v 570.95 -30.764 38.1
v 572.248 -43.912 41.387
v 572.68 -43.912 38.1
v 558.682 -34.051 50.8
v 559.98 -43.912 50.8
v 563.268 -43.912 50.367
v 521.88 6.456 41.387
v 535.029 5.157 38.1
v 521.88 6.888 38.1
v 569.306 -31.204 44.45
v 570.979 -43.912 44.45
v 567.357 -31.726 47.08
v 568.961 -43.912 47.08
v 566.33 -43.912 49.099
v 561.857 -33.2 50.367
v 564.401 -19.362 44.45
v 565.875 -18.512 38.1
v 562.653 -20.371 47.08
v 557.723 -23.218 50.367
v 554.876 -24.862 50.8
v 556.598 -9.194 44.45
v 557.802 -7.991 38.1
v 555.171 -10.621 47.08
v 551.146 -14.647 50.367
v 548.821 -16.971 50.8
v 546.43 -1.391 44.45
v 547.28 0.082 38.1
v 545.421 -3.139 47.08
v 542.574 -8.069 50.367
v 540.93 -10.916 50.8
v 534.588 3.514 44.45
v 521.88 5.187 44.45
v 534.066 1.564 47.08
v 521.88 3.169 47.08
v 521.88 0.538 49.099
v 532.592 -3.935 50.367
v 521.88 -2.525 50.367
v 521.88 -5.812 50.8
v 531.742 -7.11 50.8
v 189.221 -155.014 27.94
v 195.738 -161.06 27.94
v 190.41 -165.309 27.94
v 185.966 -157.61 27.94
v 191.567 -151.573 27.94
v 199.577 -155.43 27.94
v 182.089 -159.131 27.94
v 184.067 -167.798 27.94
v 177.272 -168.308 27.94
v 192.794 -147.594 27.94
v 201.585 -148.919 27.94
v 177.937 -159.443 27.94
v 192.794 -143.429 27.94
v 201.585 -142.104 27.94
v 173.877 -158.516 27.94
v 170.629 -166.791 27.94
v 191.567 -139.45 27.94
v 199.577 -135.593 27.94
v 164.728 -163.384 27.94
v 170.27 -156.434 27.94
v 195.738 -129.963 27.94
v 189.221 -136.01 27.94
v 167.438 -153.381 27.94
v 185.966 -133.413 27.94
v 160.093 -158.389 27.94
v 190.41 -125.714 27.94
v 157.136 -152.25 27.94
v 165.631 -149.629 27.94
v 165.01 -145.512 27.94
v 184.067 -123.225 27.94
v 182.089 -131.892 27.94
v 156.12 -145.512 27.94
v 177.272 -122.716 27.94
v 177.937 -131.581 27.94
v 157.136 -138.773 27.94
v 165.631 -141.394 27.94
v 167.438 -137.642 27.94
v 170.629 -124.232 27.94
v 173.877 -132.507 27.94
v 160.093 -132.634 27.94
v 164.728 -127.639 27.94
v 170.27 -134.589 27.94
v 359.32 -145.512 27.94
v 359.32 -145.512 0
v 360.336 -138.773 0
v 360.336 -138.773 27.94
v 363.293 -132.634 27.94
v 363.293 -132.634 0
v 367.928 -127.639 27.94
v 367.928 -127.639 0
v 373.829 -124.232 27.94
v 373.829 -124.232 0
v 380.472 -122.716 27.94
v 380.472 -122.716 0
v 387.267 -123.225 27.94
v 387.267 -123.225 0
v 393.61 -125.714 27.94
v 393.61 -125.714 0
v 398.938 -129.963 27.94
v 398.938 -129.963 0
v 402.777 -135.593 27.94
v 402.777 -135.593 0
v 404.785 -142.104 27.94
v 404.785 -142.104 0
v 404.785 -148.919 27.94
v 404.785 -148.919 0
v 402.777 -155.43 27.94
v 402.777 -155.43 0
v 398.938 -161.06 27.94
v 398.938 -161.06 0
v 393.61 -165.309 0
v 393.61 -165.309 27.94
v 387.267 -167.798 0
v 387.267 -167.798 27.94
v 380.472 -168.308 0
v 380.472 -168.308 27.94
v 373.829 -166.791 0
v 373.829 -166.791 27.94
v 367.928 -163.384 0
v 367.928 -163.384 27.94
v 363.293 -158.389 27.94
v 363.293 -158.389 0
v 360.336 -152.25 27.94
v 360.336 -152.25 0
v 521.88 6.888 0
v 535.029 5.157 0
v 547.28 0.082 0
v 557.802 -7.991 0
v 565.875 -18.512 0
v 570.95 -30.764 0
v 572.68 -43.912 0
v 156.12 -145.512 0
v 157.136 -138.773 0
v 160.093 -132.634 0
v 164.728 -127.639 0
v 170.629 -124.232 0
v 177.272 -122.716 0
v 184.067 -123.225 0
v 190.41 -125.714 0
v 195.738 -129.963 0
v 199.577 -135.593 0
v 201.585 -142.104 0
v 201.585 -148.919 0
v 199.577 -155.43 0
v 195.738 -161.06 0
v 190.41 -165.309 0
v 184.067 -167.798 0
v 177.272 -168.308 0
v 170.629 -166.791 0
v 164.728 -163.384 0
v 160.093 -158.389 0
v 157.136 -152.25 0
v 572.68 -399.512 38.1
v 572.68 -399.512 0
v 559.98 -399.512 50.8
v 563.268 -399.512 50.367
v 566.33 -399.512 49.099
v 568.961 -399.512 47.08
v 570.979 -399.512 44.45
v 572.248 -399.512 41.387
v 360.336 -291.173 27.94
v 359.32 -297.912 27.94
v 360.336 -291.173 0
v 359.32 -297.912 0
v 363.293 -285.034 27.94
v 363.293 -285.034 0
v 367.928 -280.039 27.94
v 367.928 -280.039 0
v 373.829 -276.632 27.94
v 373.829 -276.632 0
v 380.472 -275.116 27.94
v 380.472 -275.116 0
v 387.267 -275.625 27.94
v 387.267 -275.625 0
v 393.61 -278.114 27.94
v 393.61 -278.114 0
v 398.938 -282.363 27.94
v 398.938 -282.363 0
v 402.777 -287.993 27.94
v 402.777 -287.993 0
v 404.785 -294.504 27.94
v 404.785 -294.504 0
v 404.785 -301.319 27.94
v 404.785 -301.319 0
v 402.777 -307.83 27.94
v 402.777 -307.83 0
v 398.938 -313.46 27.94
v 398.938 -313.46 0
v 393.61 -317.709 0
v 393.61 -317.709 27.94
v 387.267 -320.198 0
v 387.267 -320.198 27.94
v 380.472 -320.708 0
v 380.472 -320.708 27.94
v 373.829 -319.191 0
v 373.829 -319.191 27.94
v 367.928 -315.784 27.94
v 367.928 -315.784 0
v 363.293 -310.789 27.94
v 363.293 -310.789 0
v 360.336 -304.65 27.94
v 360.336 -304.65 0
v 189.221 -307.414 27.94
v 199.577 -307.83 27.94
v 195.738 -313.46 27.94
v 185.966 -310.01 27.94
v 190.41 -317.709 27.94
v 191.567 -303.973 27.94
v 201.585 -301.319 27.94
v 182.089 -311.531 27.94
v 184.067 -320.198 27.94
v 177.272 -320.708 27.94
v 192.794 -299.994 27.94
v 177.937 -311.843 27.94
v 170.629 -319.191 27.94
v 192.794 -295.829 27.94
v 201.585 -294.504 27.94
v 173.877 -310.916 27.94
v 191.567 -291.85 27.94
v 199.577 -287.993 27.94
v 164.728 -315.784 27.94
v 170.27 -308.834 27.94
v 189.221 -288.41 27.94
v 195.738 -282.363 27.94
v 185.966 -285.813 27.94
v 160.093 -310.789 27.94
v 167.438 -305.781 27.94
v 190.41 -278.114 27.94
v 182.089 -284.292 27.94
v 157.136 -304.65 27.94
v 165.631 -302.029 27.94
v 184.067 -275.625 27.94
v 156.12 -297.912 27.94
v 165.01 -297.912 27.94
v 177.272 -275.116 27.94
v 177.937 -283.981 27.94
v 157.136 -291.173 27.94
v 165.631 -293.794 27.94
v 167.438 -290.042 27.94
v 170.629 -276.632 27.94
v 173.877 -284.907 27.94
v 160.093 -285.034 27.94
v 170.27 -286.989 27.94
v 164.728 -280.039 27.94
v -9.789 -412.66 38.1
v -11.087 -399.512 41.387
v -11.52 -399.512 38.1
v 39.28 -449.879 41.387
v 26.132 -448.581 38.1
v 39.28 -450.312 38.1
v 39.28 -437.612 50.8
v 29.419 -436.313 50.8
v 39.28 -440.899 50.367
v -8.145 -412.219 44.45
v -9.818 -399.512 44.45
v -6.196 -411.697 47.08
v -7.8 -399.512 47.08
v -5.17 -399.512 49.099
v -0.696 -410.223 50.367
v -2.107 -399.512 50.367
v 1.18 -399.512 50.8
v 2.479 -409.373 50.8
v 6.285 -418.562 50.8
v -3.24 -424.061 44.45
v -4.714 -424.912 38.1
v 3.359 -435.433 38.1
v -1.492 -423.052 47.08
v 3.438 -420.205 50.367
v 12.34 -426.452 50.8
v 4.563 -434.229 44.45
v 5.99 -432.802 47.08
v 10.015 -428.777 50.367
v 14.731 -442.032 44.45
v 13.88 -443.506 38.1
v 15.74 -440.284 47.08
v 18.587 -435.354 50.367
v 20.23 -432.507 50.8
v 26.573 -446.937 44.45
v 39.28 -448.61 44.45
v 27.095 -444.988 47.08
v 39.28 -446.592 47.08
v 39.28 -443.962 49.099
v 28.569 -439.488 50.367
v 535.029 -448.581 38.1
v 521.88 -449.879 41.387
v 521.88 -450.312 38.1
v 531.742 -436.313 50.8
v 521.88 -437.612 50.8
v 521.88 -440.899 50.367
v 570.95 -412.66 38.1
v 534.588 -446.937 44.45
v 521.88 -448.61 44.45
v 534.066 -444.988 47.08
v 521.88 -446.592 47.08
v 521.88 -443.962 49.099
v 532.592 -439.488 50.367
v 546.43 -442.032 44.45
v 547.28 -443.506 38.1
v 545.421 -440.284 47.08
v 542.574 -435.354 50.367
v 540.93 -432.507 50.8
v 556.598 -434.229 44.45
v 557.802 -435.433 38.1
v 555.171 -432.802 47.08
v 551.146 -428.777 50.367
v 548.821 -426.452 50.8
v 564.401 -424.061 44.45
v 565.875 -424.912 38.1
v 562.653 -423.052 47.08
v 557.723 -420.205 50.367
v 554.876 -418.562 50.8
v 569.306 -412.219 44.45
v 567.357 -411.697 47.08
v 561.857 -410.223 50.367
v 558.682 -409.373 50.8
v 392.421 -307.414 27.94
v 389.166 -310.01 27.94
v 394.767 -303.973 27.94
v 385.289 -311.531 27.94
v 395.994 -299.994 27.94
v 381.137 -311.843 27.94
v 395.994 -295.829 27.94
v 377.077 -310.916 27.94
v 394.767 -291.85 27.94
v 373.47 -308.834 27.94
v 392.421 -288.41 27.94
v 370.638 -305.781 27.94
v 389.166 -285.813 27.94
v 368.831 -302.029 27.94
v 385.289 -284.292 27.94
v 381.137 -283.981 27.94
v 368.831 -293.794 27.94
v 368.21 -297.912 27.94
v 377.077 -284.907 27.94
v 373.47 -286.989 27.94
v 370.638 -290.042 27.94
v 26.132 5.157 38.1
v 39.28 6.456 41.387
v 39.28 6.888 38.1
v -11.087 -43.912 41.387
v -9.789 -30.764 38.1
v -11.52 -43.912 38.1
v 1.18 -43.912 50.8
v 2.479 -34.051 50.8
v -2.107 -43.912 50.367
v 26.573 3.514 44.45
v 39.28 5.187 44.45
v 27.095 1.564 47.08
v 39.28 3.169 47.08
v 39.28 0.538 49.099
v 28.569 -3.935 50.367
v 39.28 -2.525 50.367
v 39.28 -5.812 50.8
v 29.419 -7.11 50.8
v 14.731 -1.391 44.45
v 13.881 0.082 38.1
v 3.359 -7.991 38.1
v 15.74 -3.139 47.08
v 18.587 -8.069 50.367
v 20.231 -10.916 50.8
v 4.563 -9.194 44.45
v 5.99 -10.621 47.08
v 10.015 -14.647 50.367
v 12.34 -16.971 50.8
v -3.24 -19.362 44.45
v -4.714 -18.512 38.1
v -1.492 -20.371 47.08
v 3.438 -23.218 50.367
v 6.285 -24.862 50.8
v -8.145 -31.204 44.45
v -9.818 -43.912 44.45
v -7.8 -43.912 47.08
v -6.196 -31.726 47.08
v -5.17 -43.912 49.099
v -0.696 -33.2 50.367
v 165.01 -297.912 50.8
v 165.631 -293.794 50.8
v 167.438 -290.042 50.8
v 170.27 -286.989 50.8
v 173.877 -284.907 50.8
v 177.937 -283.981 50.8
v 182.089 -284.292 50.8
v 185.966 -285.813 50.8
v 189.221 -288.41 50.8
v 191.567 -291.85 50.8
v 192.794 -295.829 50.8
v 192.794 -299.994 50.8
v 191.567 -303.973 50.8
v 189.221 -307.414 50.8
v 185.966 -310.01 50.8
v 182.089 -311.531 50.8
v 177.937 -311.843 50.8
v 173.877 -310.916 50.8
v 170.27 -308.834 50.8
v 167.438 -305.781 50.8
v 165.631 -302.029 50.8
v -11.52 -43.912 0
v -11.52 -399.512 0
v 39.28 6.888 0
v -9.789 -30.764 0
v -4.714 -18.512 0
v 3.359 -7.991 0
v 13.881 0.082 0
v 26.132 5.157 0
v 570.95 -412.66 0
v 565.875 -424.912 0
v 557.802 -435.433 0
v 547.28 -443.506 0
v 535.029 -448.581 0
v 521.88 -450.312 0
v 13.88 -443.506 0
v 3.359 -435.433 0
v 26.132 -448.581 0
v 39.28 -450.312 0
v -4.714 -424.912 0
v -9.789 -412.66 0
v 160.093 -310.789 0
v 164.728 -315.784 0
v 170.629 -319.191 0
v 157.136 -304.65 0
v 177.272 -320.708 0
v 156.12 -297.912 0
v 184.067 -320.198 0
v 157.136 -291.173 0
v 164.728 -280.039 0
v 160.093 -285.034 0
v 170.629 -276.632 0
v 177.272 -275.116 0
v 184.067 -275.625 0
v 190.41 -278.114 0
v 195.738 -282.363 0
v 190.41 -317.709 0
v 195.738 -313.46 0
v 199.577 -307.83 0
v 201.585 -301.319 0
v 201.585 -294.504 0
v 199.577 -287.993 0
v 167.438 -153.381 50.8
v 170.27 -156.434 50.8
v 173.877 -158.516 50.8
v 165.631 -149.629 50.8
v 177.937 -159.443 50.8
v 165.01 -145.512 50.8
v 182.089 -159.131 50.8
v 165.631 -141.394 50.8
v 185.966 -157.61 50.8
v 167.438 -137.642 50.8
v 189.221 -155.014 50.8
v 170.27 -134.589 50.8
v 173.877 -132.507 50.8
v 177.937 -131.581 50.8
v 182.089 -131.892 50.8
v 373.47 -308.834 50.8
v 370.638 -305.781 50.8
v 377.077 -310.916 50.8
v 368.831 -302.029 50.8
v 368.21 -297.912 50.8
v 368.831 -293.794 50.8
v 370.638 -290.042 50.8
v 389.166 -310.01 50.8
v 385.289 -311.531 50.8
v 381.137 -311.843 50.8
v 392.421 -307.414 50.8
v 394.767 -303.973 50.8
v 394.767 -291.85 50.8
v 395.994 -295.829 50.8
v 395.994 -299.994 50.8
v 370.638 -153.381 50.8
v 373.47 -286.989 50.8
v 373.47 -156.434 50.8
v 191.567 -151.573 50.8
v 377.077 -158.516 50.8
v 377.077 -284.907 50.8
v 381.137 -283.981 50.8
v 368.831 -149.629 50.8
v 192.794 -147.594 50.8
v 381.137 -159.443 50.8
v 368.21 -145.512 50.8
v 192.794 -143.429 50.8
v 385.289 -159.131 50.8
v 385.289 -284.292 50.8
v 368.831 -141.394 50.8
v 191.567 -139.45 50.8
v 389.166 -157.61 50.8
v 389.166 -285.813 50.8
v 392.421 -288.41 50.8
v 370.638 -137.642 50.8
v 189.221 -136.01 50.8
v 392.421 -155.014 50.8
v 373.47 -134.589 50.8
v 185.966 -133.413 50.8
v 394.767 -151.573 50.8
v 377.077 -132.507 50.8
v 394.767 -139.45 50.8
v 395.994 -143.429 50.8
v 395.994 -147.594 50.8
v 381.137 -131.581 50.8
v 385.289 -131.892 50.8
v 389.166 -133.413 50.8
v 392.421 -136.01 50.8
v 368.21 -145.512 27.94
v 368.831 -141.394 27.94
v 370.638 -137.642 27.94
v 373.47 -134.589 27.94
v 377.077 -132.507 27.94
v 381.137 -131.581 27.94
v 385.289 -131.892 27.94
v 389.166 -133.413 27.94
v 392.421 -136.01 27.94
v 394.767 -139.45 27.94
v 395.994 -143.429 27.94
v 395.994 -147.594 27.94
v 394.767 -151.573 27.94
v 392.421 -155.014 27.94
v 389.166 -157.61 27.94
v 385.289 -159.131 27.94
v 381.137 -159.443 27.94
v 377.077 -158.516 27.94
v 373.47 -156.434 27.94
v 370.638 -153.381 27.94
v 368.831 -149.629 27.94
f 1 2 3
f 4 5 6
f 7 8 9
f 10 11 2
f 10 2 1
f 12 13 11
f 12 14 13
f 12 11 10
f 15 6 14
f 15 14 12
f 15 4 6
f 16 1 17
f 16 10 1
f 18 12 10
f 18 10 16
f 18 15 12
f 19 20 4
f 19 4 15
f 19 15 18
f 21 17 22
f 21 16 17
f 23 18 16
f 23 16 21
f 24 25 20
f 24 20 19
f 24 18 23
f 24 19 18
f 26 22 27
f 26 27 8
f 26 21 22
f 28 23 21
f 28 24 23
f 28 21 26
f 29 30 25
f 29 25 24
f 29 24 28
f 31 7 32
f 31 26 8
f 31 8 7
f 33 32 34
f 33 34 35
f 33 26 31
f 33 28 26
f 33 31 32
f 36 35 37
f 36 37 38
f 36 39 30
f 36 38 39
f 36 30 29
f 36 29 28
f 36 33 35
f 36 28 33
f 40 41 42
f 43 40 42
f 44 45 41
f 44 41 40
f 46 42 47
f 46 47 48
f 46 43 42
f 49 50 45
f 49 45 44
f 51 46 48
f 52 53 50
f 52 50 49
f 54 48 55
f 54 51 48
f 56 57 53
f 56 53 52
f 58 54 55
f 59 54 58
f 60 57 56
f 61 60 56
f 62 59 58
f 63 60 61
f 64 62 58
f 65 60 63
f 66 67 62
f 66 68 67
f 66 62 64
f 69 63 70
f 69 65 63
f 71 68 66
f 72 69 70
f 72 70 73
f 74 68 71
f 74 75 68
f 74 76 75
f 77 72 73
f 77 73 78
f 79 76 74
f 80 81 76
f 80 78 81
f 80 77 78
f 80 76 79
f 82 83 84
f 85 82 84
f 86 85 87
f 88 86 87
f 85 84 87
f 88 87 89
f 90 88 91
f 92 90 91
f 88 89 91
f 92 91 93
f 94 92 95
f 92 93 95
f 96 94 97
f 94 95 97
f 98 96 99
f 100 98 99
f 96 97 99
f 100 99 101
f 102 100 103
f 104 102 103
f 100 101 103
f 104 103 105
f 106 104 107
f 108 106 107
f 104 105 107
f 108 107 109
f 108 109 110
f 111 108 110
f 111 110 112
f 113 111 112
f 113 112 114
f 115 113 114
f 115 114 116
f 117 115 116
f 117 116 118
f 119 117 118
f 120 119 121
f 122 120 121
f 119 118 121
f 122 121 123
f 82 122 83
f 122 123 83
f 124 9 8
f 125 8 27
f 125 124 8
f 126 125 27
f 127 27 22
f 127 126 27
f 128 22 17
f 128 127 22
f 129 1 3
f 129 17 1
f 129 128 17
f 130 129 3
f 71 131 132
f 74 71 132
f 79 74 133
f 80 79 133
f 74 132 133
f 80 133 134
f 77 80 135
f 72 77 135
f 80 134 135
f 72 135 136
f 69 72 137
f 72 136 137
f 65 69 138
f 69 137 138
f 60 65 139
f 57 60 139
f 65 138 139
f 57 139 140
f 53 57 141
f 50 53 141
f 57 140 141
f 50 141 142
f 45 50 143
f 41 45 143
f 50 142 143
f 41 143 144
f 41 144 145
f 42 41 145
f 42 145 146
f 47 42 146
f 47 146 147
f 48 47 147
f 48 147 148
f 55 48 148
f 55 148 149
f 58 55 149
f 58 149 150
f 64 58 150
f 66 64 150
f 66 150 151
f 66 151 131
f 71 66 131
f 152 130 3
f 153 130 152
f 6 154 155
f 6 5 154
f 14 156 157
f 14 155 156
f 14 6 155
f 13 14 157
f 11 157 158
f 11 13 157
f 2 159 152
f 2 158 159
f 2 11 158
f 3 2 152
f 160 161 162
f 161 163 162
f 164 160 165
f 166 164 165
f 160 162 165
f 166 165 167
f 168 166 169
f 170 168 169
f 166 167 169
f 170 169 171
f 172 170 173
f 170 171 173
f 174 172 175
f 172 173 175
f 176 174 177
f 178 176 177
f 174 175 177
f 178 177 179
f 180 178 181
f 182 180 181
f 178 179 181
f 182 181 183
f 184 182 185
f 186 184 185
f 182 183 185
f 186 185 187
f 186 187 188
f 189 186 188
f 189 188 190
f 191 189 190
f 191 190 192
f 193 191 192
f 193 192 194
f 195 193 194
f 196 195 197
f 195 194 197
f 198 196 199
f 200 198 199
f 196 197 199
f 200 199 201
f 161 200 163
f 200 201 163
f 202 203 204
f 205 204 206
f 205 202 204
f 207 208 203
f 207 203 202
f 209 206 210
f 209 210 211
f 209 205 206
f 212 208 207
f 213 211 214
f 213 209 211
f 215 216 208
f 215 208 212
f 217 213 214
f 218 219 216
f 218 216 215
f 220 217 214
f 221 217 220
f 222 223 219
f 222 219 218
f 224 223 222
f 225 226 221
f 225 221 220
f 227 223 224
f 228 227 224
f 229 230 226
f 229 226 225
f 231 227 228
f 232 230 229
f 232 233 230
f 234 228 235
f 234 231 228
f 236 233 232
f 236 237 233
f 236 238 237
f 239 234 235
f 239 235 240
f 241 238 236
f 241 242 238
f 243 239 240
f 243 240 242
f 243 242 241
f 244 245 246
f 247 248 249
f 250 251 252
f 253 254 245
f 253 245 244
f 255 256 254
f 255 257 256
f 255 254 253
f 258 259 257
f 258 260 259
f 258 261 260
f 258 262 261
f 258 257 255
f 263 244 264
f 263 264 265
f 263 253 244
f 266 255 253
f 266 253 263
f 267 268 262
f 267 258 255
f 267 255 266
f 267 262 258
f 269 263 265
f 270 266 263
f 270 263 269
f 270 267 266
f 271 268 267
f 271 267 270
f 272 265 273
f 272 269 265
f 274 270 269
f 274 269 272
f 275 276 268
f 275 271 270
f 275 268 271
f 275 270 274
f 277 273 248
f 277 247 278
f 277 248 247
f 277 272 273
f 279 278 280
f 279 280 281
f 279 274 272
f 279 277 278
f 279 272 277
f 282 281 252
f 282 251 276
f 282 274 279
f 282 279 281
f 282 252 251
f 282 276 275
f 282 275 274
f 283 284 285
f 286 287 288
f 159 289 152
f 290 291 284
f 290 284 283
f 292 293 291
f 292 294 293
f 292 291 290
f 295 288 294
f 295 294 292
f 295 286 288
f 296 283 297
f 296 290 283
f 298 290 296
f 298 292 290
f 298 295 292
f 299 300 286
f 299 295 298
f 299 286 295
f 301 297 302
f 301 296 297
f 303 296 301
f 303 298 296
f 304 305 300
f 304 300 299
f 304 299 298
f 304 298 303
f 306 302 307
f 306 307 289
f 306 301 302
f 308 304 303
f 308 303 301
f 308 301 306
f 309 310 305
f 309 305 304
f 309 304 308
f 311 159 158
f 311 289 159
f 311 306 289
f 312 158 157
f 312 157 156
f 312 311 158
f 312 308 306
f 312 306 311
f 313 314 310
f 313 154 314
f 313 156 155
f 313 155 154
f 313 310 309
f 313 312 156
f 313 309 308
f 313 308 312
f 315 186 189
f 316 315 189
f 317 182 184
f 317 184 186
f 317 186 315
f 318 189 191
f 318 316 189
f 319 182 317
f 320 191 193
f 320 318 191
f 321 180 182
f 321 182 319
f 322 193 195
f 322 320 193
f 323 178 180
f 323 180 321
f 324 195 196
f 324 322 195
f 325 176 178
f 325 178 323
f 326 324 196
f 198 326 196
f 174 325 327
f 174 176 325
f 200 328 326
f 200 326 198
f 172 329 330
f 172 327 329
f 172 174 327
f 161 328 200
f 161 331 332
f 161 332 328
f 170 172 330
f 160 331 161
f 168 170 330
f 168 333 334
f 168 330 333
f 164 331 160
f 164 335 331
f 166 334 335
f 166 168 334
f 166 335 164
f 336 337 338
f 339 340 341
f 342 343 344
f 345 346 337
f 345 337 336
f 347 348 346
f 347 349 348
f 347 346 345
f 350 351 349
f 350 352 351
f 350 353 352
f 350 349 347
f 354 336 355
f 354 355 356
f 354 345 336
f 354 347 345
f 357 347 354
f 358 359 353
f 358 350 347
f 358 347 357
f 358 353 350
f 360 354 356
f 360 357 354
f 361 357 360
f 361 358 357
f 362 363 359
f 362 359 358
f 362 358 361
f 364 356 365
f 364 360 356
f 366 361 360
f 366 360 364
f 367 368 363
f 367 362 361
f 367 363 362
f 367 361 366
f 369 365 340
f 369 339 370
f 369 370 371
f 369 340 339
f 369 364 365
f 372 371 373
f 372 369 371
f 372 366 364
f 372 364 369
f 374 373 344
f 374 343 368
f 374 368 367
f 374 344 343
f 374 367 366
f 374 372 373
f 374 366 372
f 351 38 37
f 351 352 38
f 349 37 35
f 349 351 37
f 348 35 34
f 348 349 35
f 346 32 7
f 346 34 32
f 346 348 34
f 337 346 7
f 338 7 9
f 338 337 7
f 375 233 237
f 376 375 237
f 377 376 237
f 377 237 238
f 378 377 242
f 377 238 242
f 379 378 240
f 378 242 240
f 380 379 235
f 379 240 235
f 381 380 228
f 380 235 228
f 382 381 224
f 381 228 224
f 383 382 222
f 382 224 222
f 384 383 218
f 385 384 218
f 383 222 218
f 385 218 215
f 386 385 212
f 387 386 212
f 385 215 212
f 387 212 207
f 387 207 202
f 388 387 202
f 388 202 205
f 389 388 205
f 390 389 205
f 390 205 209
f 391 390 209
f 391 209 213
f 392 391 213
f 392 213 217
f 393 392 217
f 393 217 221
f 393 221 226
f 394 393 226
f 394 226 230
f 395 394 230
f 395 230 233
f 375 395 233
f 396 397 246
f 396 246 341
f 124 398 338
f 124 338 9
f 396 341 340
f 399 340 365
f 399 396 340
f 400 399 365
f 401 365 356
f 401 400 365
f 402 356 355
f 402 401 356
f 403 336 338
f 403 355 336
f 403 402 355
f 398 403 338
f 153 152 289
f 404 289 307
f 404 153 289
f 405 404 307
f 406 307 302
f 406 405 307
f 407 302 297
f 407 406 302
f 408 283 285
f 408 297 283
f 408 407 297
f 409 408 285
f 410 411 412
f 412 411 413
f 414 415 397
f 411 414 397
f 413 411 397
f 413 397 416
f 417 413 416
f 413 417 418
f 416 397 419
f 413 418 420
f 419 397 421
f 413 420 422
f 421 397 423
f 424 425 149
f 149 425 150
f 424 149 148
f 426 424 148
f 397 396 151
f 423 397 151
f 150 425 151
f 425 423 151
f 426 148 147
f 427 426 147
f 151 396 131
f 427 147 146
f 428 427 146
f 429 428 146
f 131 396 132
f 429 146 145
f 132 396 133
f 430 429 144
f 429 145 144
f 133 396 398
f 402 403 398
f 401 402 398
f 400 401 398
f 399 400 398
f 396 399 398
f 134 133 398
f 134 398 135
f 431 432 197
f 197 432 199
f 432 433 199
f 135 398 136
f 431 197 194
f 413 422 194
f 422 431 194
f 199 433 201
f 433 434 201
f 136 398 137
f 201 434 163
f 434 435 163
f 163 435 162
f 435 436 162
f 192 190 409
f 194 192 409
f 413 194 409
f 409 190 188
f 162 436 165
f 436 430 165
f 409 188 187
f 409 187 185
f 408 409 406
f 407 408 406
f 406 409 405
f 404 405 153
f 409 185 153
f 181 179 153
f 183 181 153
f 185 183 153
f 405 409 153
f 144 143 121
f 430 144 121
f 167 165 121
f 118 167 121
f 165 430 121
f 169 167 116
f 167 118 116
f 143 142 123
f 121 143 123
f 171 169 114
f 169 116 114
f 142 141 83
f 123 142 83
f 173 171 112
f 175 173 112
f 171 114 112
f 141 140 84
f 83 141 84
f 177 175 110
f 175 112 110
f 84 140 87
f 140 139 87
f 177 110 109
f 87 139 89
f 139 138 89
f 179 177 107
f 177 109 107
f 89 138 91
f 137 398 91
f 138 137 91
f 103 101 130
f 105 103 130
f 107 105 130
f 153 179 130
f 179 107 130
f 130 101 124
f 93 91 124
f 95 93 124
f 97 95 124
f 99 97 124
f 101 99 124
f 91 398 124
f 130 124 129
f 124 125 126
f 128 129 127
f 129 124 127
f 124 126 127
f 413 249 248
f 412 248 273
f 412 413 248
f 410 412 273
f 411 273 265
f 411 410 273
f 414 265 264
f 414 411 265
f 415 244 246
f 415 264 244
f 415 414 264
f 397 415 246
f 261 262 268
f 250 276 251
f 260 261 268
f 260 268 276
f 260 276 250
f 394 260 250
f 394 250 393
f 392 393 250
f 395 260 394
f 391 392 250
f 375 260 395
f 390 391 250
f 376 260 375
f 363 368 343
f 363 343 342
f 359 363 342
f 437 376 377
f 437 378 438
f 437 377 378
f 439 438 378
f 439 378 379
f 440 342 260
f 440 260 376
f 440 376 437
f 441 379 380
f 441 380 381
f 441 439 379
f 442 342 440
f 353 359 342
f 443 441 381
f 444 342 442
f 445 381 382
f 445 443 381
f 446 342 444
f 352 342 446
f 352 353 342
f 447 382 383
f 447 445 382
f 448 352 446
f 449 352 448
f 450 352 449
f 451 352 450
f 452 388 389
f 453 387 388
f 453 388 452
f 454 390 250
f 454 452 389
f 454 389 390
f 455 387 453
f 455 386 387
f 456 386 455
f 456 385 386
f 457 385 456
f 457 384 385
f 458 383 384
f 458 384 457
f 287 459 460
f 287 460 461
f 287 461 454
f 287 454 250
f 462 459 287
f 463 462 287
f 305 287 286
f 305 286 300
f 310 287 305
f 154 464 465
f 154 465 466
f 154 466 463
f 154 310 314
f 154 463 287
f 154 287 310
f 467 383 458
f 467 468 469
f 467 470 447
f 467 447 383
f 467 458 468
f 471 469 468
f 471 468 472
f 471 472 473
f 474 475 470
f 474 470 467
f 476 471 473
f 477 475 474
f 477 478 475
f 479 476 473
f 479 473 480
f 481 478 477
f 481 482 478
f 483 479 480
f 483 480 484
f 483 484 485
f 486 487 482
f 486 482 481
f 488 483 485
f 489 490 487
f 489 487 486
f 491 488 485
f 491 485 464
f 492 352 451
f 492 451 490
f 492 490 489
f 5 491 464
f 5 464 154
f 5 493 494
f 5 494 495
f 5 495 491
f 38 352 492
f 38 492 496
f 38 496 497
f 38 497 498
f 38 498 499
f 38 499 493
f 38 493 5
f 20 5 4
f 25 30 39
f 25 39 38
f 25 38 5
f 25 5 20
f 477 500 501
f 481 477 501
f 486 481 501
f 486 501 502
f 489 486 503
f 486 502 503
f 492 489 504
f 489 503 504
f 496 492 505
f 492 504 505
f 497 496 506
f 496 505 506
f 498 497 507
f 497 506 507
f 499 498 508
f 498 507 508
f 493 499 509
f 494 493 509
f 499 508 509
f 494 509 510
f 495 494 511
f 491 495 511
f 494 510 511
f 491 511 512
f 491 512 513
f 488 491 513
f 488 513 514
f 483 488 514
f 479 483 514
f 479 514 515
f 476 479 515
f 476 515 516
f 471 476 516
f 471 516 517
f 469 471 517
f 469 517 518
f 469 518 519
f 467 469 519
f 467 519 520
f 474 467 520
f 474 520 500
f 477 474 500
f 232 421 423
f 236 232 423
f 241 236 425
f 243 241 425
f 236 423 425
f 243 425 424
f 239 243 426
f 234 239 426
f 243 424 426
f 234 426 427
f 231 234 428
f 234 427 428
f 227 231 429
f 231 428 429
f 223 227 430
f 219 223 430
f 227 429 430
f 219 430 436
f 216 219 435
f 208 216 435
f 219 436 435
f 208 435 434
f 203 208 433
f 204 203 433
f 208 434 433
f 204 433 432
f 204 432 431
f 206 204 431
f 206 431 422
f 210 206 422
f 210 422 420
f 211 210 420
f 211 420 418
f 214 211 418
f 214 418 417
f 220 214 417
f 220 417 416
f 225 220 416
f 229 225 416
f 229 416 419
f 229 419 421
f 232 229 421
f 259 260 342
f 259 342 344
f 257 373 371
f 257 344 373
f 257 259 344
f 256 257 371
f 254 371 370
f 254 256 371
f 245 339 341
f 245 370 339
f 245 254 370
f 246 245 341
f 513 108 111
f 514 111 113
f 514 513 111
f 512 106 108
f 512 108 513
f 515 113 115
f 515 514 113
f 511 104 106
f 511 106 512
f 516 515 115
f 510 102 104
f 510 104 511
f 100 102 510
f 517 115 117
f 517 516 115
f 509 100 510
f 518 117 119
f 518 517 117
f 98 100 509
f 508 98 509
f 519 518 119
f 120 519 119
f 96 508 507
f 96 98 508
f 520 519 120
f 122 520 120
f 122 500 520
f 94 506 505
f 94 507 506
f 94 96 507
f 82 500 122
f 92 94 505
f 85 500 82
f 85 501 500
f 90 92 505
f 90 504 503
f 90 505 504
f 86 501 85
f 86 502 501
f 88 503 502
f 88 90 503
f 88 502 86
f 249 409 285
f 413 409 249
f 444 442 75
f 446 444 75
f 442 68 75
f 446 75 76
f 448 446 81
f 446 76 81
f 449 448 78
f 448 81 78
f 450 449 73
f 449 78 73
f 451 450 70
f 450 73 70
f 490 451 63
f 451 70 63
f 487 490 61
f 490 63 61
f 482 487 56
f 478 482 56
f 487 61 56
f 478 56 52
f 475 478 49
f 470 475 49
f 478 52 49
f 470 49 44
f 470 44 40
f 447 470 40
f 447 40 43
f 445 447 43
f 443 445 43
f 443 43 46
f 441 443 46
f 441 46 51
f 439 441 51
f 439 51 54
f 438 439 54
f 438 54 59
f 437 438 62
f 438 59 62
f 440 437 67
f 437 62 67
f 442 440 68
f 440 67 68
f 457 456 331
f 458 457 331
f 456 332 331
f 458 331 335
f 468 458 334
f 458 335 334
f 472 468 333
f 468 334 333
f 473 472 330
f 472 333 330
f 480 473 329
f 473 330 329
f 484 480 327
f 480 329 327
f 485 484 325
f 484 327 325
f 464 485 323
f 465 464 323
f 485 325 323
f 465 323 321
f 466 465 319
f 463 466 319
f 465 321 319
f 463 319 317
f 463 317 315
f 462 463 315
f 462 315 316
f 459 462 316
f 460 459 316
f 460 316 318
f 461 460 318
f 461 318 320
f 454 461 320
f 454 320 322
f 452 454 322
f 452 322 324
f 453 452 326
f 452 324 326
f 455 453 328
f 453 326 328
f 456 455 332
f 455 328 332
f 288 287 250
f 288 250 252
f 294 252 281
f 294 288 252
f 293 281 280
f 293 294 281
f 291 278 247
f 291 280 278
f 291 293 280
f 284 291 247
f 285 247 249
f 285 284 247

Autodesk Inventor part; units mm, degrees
ref_plane "YZ Plane" through (0, 0, 0) normal (1, 0, 0) x (0, 1, 0)
ref_plane "XZ Plane" through (0, 0, 0) normal (0, 1, 0) x (-1, 0, 0)
ref_plane "XY Plane" through (0, 0, 0) normal (0, 0, 1) x (1, 0, 0)
sketch "Sketch1" plane through (0, 0, 0) normal (0, 0, 1) x (1, 0, 0)
  line L0 (39.2805, 6.8884) -> (521.8805, 6.8884)
  line L1 (572.6805, -43.9116) -> (572.6805, -399.5116)
  line L2 (521.8805, -450.3116) -> (39.2805, -450.3116)
  line L3 (-11.5195, -399.5116) -> (-11.5195, -43.9116)
  arc A0 (-11.5195, -399.5116) -> (39.2805, -450.3116) centre (39.2805, -399.5116) ccw
  arc A1 (39.2805, 6.8884) -> (-11.5195, -43.9116) centre (39.2805, -43.9116) ccw
  arc A2 (572.6805, -43.9116) -> (521.8805, 6.8884) centre (521.8805, -43.9116) ccw
  arc A3 (521.8805, -450.3116) -> (572.6805, -399.5116) centre (521.8805, -399.5116) ccw
  line L4 (280.5805, -450.3116) -> (280.5805, 6.8884)
  line L5 (-11.5195, -221.7116) -> (572.6805, -221.7116)
  circle A4 centre (471.0805, -315.7964) radius 22.86 construction
  circle A5 centre (471.0805, -315.7964) radius 13.97 construction
  circle A6 centre (90.0805, -315.7964) radius 22.86 construction
  circle A7 centre (90.0805, -315.7964) radius 13.97 construction
  circle A8 centre (471.0805, -127.6267) radius 22.86 construction
  circle A9 centre (471.0805, -127.6267) radius 13.97 construction
  circle A10 centre (90.0805, -127.6267) radius 22.86 construction
  circle A11 centre (90.0805, -127.6267) radius 13.97 construction
  point P0 (0, 0)
  point P1 (572.6805, -450.3116)
  point P2 (572.6805, 6.8884)
  point P3 (-11.5195, -450.3116)
  dimension "d0" = 584.2
  dimension "d1" = 457.2
  dimension "d2" = 50.8
  dimension "d3" = 50.8
  dimension "d11" = 45.72
  dimension "d12" = 27.94
  dimension "d13" = 94.0848
  dimension "d14" = 190.5
extrude "Extrusion1" add sketch "Sketch1" along normal blind 50.8
fillet "Fillet1" radius 12.7 8 edges at (3.3595, -7.9905, 50.8) (-11.5195, -221.7116, 50.8) (3.3595, -435.4326, 50.8) (280.5805, -450.3116, 50.8) (557.8015, -435.4326, 50.8) (572.6805, -221.7116, 50.8) (557.8015, -7.9905, 50.8) (280.5805, 6.8884, 50.8)
sketch "Sketch2" plane through (0, 0, 0) normal (0, 0, -1) x (-1, 0, 0)
  circle A0 centre (-178.9805, -297.9116) radius 22.86
  circle A1 centre (-178.9805, -297.9116) radius 13.97
  line L0 (-521.8805, 6.8884) -> (-39.2805, 6.8884) projected
  line L1 (-280.5805, 6.8884) -> (-280.5805, -454.4869)
  line L2 (-572.6805, -399.5116) -> (-572.6805, -43.9116) projected
  line L3 (-572.6805, -221.7116) -> (11.5195, -221.7116)
  line L4 (11.5195, -43.9116) -> (11.5195, -399.5116) projected
  circle A2 centre (-382.1805, -297.9116) radius 22.86
  circle A3 centre (-382.1805, -297.9116) radius 13.97
  circle A4 centre (-178.9805, -145.5116) radius 22.86
  circle A5 centre (-178.9805, -145.5116) radius 13.97
  circle A6 centre (-382.1805, -145.5116) radius 22.86
  circle A7 centre (-382.1805, -145.5116) radius 13.97
  point P0 (0, 0)
  dimension "d15" = 45.72
  dimension "d16" = 27.94
  dimension "d17" = 76.2
  dimension "d18" = 190.5
extrude "Extrusion2" cut sketch "Sketch2" against normal through all contours A1 | A3 | A5 | A7
extrude "Extrusion3" cut sketch "Sketch2" against normal blind 27.94 contours A0 | A2 | A4 | A5 | A6
equation "\"BendRadius\" = Thickness"
equation "\"BendReliefWidth\" = Thickness"
equation "\"BendReliefDepth\" = 0.5 * Thickness"
equation "\"CornerReliefSize\" = 4 * Thickness"
equation "\"MinimumRemnant\" = 2 * Thickness"
equation "\"TransitionRadius\" = BendRadius"
equation "\"JacobiRadiusSize\" = BendRadius"
equation "\"GapSize\" = Thickness"
equation "\"Thickness\" = 3.048"
properties part number "stand" material "Wood (Oak)"
